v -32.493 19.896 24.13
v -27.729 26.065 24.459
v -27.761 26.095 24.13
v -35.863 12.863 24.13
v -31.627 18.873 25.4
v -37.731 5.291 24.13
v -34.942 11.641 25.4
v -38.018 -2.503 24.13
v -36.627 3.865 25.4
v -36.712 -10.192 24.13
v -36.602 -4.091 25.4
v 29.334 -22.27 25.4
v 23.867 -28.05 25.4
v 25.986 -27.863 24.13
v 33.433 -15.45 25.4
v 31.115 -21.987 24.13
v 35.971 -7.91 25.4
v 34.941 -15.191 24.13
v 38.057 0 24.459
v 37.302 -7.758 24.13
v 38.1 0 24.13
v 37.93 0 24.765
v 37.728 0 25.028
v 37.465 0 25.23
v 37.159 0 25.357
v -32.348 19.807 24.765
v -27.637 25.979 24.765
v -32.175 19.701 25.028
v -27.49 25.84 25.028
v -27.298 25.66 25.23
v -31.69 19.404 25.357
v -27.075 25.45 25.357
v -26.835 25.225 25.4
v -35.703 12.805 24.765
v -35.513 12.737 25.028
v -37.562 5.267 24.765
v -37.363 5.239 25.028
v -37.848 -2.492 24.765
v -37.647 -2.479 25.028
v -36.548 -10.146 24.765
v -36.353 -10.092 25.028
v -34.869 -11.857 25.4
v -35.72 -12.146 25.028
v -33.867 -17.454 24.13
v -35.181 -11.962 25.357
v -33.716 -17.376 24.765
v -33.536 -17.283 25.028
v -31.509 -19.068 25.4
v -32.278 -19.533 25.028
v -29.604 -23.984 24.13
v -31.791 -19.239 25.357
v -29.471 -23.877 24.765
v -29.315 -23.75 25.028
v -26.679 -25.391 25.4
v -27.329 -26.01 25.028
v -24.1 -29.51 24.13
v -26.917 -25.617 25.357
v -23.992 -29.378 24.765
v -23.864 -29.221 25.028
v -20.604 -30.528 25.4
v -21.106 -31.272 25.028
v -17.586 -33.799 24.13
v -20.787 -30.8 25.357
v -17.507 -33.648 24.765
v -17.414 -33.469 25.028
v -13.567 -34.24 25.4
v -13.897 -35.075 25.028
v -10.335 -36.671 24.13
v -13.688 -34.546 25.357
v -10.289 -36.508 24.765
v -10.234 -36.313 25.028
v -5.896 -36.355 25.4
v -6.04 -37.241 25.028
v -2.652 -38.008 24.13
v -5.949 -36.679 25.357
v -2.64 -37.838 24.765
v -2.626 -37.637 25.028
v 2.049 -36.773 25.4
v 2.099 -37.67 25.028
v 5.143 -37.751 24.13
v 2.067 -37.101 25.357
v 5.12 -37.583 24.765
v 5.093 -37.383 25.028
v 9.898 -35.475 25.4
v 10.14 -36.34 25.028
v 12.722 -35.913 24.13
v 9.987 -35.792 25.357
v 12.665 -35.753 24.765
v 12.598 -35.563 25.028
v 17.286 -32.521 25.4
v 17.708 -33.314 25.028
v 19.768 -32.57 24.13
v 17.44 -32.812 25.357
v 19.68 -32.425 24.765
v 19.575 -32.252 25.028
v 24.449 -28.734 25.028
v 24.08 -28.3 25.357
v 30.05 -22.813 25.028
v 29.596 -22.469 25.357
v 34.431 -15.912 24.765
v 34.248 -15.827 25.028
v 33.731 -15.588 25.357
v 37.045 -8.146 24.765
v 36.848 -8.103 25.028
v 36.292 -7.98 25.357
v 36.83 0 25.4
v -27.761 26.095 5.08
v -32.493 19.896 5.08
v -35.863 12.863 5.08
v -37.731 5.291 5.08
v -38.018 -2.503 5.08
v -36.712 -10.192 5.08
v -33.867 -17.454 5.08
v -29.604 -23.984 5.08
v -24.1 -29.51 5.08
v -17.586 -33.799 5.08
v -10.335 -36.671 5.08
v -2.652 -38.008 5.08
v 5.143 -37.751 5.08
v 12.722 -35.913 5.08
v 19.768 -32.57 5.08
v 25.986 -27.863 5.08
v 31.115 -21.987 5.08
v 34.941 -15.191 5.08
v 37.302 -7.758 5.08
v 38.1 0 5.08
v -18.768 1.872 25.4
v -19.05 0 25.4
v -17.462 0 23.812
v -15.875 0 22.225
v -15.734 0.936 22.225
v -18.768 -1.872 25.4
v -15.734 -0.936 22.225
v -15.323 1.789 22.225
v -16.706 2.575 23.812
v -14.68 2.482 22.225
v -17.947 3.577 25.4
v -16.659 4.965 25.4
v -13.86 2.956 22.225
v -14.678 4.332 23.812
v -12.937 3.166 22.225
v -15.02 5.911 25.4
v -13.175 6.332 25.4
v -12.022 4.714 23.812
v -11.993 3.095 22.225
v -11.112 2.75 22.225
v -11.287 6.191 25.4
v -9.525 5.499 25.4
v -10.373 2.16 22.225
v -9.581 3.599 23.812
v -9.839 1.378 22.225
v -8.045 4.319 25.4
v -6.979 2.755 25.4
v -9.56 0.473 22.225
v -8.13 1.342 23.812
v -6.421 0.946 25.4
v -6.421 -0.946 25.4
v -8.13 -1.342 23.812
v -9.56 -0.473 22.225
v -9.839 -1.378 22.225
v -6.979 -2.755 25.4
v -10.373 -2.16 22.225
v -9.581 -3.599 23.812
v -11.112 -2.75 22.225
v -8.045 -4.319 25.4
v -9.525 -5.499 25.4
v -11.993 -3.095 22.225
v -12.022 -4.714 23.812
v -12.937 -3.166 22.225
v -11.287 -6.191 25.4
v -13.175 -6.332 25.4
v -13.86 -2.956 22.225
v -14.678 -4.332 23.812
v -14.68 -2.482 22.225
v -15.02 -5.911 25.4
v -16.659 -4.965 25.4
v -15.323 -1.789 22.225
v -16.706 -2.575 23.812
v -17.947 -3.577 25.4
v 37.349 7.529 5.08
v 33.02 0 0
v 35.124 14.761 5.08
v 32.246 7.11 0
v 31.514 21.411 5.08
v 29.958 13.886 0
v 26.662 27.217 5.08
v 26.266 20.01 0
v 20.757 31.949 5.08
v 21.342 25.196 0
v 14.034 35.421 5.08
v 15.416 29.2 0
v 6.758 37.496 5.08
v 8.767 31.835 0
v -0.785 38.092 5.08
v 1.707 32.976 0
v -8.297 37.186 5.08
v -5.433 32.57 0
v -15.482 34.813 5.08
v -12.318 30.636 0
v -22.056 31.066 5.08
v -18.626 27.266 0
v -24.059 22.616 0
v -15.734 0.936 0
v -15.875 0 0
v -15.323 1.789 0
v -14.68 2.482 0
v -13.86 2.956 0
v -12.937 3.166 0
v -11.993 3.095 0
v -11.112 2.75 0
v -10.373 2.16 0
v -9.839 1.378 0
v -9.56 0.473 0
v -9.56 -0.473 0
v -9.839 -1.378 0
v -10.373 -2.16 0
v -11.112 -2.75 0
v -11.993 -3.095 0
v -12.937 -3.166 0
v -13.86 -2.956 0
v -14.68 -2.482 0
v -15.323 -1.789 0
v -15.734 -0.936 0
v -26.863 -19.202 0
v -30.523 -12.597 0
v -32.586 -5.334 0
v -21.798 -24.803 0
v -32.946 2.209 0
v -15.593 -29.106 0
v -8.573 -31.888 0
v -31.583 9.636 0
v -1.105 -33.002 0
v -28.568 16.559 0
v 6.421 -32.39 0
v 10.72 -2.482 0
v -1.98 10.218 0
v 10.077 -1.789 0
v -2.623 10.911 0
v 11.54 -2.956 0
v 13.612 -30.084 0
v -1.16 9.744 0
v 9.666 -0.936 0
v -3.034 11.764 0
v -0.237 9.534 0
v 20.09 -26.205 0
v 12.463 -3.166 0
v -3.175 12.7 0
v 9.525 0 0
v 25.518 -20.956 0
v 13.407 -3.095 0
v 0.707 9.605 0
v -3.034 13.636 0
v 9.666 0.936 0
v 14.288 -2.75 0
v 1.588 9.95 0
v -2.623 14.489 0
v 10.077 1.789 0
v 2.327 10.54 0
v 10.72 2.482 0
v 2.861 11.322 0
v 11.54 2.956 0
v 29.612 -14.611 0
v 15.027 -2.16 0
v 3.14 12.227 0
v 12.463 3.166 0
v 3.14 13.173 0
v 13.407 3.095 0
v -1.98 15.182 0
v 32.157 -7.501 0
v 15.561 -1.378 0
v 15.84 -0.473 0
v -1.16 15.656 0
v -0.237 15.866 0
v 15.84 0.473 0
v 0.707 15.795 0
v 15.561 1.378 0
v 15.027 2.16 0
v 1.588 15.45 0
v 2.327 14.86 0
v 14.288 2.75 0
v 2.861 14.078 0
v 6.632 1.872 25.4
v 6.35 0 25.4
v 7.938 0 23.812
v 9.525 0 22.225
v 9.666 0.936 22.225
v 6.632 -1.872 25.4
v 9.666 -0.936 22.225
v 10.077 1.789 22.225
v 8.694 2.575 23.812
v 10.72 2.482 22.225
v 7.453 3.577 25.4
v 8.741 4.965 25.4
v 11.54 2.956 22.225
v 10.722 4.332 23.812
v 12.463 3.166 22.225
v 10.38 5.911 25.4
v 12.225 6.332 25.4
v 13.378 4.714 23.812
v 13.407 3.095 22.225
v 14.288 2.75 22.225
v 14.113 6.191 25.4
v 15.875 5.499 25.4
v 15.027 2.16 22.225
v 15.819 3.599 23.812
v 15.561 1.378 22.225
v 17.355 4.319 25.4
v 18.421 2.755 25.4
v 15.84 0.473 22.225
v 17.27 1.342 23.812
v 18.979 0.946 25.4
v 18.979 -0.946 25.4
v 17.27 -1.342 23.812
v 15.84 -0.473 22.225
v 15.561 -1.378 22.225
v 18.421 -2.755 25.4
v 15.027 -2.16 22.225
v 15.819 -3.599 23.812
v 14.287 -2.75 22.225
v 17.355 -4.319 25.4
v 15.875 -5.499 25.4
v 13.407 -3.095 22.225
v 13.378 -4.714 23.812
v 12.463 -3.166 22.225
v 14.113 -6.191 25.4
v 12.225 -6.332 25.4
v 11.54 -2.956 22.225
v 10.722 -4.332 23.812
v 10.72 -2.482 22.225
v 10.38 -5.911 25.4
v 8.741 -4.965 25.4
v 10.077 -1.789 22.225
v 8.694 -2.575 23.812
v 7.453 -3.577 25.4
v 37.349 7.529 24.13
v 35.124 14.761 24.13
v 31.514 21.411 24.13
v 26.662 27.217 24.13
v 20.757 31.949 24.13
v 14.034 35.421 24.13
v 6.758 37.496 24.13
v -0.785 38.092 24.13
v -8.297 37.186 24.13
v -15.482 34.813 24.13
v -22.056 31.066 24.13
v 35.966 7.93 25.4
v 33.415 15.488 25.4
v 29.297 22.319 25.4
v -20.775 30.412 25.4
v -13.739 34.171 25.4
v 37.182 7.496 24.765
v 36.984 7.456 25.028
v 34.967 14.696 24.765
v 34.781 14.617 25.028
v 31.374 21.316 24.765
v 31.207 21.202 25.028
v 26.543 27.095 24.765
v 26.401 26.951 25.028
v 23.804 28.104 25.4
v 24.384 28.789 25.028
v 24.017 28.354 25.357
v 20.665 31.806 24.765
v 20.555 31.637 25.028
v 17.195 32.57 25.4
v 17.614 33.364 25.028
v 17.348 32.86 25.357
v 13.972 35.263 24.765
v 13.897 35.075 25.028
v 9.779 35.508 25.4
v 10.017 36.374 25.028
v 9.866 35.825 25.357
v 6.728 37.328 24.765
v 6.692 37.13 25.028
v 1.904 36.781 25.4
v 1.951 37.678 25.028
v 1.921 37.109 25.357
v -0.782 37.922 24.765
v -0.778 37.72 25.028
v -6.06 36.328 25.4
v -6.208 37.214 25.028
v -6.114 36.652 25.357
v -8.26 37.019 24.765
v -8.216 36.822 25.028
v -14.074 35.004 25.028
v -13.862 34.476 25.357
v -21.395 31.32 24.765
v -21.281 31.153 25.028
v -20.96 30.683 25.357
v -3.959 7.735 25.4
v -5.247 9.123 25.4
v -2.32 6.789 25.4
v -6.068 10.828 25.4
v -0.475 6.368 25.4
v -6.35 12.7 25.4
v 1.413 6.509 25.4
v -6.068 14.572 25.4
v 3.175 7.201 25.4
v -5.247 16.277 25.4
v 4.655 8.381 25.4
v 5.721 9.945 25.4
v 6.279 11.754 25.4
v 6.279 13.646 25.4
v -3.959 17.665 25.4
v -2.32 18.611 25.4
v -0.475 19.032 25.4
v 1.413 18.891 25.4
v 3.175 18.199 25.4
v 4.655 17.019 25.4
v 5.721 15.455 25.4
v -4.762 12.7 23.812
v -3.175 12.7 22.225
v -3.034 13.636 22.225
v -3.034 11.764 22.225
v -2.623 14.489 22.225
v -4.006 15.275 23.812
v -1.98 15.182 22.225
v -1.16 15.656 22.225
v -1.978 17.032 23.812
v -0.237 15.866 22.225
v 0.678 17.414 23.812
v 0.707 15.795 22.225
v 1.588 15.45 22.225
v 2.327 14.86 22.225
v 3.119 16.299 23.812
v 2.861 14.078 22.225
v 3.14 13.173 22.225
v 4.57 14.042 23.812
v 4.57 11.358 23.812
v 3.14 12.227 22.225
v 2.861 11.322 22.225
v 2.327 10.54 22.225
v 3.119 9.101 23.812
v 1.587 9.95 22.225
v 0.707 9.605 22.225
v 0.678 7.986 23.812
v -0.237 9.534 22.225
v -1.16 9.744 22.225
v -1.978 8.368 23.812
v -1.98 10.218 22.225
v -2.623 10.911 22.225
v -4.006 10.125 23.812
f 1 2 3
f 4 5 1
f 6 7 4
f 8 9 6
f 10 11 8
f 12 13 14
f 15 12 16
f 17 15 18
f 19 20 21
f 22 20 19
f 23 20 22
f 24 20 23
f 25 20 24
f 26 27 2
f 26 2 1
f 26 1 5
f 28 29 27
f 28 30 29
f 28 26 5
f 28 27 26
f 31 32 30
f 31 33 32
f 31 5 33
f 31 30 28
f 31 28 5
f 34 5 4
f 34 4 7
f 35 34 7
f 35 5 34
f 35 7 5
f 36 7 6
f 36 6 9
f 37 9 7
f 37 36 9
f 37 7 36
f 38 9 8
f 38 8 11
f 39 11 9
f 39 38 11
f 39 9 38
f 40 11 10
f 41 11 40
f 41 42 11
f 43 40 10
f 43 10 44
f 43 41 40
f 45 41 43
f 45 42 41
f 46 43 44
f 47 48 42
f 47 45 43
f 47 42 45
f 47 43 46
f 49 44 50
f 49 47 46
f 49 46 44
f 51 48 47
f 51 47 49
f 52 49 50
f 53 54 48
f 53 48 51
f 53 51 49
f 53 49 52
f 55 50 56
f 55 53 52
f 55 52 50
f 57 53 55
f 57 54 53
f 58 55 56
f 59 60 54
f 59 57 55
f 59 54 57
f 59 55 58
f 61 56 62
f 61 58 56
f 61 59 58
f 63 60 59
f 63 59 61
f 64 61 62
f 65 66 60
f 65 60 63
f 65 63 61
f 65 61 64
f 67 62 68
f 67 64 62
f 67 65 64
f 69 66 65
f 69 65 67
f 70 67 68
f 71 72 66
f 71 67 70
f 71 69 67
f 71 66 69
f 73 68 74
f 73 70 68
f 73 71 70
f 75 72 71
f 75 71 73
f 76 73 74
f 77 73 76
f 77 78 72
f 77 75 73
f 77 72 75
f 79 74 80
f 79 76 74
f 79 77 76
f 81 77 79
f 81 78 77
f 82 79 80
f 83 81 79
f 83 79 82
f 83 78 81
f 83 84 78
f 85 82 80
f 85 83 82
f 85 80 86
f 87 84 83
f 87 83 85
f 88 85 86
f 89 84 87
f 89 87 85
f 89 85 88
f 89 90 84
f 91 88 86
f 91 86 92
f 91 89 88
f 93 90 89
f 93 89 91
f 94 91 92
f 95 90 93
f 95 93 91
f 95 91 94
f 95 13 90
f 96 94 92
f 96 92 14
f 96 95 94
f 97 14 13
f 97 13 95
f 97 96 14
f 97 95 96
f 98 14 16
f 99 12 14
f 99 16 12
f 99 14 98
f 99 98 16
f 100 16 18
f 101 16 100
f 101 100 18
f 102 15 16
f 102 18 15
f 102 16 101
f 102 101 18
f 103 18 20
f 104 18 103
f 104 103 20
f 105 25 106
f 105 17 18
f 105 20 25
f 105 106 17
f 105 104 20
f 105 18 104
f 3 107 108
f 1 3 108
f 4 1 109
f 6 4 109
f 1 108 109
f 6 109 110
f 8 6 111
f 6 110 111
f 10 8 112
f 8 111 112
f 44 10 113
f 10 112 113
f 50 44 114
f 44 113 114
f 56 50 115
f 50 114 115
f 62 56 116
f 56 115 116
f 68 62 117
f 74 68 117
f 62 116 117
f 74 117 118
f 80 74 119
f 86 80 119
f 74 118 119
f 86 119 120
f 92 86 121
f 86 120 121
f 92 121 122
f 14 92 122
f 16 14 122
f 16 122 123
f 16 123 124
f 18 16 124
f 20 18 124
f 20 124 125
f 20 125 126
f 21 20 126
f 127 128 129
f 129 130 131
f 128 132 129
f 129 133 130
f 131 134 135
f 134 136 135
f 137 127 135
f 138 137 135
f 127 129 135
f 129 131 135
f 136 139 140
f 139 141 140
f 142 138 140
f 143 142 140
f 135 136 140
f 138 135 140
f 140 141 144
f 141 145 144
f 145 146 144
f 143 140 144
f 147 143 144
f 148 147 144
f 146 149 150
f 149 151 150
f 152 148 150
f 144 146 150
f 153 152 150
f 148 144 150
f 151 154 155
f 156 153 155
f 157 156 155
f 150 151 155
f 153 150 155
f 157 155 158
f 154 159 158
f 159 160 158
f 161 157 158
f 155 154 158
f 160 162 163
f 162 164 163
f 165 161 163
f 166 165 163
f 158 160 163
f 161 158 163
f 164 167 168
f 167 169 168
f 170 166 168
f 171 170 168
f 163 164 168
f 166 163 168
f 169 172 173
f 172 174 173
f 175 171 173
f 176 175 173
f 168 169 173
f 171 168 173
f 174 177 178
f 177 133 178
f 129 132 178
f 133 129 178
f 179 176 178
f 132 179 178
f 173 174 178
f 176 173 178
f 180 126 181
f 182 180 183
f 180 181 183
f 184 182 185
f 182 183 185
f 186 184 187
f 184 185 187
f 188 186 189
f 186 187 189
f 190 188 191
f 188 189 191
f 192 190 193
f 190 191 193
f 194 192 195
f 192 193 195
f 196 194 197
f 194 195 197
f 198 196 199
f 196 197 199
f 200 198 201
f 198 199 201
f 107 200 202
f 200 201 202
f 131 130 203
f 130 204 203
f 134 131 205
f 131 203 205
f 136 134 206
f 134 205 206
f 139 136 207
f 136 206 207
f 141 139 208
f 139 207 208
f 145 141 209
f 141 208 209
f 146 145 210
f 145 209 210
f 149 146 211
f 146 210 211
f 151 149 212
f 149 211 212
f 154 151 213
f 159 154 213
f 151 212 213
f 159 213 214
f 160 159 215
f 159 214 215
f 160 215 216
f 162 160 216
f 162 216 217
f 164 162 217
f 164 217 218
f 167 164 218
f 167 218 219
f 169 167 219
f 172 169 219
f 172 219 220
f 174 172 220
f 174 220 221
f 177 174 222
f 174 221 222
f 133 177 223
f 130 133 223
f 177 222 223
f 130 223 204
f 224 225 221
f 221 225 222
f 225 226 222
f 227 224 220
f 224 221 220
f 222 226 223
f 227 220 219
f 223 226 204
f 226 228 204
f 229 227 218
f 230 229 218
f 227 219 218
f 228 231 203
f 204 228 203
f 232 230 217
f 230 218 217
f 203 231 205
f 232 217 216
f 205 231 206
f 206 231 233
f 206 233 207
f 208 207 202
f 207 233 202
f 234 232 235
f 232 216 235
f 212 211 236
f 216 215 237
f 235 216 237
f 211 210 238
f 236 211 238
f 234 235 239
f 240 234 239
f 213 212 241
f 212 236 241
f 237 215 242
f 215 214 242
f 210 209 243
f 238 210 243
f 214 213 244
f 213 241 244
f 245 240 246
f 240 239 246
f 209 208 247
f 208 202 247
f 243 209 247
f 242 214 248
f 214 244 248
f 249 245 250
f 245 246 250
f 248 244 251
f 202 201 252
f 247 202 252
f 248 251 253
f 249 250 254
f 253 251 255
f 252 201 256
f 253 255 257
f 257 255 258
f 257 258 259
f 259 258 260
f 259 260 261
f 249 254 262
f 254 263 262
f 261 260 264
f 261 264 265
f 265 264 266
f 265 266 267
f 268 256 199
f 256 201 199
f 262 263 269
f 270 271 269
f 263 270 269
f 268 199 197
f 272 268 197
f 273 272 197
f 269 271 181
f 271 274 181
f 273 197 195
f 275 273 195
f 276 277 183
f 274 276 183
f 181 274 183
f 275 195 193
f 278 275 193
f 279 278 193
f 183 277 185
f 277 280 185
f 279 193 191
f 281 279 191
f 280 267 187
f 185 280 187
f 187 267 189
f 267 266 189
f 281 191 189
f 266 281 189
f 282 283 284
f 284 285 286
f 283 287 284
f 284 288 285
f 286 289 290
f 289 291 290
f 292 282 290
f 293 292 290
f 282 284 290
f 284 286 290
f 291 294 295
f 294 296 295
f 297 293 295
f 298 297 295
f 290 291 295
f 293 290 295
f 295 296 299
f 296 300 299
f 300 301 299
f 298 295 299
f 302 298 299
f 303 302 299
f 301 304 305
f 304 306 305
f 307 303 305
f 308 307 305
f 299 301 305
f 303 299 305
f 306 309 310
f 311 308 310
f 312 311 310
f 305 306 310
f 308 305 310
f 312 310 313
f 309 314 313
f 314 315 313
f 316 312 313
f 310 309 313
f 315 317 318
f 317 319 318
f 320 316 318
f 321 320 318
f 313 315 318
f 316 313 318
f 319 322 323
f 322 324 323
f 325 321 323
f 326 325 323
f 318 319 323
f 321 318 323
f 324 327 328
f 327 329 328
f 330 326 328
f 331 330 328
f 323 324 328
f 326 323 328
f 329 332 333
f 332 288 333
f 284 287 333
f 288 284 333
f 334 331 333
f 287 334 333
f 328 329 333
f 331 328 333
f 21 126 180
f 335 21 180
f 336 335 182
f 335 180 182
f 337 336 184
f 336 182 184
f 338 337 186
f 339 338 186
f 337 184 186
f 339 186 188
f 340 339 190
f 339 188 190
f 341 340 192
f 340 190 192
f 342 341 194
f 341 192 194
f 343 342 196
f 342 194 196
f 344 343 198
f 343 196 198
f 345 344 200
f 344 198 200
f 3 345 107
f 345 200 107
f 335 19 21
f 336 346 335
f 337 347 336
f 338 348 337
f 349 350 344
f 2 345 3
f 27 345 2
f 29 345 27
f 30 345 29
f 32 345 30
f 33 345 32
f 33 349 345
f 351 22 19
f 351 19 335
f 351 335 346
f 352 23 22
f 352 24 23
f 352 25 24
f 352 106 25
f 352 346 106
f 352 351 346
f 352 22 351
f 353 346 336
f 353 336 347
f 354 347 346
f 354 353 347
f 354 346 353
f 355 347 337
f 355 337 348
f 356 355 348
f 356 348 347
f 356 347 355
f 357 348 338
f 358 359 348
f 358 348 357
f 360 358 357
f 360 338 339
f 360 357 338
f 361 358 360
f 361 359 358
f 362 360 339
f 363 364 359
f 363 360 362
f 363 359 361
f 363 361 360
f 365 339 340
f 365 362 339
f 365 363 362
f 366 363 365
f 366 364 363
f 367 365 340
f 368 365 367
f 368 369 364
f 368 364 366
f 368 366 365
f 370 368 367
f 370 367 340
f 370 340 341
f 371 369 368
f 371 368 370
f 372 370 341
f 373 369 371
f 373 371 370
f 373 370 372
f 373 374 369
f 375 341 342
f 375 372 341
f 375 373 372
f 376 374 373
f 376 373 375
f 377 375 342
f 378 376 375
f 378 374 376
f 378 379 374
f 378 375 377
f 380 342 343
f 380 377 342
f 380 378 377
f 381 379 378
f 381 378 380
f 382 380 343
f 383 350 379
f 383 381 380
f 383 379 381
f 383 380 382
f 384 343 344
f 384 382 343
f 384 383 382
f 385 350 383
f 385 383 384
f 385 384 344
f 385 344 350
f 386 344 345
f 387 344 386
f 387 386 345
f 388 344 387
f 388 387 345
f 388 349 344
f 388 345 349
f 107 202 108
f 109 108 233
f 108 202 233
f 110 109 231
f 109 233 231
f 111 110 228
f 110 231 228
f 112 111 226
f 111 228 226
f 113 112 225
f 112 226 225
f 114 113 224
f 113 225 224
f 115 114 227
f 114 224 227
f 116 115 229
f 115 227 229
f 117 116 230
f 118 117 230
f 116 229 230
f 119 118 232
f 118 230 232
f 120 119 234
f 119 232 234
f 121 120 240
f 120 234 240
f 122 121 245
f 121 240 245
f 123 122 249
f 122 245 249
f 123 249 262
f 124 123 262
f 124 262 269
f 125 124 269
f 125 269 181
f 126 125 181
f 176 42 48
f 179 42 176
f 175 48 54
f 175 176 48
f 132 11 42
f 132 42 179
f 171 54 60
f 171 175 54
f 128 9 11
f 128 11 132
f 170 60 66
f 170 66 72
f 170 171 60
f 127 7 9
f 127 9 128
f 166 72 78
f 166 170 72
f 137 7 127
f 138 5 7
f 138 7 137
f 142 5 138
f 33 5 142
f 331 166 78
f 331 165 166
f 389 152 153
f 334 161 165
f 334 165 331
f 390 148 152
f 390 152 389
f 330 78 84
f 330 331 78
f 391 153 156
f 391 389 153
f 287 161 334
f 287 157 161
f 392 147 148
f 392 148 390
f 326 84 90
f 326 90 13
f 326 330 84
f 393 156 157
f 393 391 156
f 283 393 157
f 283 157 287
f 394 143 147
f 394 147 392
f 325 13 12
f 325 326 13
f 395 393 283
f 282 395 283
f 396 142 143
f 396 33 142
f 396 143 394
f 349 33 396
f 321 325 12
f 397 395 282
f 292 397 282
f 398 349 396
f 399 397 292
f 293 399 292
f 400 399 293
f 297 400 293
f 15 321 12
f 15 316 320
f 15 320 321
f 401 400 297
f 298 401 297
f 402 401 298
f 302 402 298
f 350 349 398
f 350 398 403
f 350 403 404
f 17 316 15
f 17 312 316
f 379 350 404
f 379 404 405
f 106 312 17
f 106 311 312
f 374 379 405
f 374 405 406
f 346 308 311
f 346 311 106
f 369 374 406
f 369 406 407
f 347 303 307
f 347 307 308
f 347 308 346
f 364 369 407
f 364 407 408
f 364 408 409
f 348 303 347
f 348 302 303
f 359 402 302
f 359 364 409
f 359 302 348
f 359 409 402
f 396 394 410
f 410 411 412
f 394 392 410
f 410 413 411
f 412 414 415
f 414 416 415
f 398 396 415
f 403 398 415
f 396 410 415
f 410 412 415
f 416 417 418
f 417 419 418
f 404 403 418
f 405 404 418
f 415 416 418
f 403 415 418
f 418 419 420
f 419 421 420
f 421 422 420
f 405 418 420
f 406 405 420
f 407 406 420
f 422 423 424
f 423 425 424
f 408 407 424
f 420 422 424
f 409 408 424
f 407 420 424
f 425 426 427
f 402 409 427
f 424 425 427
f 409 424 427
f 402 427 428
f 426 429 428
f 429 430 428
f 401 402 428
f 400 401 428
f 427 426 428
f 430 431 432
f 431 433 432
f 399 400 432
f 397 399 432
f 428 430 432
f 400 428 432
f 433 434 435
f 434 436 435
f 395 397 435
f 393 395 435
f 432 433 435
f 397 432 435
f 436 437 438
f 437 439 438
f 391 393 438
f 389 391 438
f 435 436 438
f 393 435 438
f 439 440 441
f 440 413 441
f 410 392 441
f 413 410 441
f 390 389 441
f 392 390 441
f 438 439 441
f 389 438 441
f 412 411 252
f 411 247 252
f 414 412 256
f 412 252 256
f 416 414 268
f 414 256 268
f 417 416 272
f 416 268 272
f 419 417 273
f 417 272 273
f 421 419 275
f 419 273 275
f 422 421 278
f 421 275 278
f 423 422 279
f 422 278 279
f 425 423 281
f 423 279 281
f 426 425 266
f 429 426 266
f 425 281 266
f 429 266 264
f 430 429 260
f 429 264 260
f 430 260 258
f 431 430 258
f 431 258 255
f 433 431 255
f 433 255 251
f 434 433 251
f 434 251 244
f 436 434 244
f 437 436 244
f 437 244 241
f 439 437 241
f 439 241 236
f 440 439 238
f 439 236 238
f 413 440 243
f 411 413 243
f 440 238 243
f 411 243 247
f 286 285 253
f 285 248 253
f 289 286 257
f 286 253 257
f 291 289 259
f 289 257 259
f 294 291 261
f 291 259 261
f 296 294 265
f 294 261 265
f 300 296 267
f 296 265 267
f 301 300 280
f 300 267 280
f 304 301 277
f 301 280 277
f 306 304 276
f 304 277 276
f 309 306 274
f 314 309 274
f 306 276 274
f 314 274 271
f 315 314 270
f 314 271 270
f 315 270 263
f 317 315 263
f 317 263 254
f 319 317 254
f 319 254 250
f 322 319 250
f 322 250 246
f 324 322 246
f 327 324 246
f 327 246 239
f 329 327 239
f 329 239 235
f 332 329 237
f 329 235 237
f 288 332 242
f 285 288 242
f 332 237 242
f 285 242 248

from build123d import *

# Parameters (mm, degrees)
F1_DEPTH       = 25.4
F3_D           = 6.35
F3_CSINK_D     = 12.7
F3_CSINK_ANGLE = 90
F4_R           = 1.27
F5_SIZE        = 5.08


with BuildPart() as f1:
    # F0 (on Top) → F1 (new body)
    with BuildSketch(Plane.XY):
        with BuildLine():
            ThreePointArc((-27.760715, 26.09507), (-14.034364, -35.420991), (38.1, 0))
            ThreePointArc((38.1, 0), (14.034364, 35.420991), (-27.760715, 26.09507))
        make_face()
    extrude(amount=F1_DEPTH)

    # F3 (through all)
    with Locations(Plane.XY.offset(25.4)):
        with Locations((-12.7, 0), (0, 12.7), (12.7, 0)):
            CounterSinkHole(F3_D / 2, F3_CSINK_D / 2, counter_sink_angle=F3_CSINK_ANGLE)

    # F4
    f4_edges = [f1.edges().sort_by_distance(p)[0] for p in [
        (-38.1, 0, 25.4),
    ]]
    fillet(f4_edges, radius=F4_R)

    # F5
    f5_edges = [f1.edges().sort_by_distance(p)[0] for p in [
        (-38.1, 0, 0),
    ]]
    chamfer(f5_edges, length=F5_SIZE)


solid = f1.part
